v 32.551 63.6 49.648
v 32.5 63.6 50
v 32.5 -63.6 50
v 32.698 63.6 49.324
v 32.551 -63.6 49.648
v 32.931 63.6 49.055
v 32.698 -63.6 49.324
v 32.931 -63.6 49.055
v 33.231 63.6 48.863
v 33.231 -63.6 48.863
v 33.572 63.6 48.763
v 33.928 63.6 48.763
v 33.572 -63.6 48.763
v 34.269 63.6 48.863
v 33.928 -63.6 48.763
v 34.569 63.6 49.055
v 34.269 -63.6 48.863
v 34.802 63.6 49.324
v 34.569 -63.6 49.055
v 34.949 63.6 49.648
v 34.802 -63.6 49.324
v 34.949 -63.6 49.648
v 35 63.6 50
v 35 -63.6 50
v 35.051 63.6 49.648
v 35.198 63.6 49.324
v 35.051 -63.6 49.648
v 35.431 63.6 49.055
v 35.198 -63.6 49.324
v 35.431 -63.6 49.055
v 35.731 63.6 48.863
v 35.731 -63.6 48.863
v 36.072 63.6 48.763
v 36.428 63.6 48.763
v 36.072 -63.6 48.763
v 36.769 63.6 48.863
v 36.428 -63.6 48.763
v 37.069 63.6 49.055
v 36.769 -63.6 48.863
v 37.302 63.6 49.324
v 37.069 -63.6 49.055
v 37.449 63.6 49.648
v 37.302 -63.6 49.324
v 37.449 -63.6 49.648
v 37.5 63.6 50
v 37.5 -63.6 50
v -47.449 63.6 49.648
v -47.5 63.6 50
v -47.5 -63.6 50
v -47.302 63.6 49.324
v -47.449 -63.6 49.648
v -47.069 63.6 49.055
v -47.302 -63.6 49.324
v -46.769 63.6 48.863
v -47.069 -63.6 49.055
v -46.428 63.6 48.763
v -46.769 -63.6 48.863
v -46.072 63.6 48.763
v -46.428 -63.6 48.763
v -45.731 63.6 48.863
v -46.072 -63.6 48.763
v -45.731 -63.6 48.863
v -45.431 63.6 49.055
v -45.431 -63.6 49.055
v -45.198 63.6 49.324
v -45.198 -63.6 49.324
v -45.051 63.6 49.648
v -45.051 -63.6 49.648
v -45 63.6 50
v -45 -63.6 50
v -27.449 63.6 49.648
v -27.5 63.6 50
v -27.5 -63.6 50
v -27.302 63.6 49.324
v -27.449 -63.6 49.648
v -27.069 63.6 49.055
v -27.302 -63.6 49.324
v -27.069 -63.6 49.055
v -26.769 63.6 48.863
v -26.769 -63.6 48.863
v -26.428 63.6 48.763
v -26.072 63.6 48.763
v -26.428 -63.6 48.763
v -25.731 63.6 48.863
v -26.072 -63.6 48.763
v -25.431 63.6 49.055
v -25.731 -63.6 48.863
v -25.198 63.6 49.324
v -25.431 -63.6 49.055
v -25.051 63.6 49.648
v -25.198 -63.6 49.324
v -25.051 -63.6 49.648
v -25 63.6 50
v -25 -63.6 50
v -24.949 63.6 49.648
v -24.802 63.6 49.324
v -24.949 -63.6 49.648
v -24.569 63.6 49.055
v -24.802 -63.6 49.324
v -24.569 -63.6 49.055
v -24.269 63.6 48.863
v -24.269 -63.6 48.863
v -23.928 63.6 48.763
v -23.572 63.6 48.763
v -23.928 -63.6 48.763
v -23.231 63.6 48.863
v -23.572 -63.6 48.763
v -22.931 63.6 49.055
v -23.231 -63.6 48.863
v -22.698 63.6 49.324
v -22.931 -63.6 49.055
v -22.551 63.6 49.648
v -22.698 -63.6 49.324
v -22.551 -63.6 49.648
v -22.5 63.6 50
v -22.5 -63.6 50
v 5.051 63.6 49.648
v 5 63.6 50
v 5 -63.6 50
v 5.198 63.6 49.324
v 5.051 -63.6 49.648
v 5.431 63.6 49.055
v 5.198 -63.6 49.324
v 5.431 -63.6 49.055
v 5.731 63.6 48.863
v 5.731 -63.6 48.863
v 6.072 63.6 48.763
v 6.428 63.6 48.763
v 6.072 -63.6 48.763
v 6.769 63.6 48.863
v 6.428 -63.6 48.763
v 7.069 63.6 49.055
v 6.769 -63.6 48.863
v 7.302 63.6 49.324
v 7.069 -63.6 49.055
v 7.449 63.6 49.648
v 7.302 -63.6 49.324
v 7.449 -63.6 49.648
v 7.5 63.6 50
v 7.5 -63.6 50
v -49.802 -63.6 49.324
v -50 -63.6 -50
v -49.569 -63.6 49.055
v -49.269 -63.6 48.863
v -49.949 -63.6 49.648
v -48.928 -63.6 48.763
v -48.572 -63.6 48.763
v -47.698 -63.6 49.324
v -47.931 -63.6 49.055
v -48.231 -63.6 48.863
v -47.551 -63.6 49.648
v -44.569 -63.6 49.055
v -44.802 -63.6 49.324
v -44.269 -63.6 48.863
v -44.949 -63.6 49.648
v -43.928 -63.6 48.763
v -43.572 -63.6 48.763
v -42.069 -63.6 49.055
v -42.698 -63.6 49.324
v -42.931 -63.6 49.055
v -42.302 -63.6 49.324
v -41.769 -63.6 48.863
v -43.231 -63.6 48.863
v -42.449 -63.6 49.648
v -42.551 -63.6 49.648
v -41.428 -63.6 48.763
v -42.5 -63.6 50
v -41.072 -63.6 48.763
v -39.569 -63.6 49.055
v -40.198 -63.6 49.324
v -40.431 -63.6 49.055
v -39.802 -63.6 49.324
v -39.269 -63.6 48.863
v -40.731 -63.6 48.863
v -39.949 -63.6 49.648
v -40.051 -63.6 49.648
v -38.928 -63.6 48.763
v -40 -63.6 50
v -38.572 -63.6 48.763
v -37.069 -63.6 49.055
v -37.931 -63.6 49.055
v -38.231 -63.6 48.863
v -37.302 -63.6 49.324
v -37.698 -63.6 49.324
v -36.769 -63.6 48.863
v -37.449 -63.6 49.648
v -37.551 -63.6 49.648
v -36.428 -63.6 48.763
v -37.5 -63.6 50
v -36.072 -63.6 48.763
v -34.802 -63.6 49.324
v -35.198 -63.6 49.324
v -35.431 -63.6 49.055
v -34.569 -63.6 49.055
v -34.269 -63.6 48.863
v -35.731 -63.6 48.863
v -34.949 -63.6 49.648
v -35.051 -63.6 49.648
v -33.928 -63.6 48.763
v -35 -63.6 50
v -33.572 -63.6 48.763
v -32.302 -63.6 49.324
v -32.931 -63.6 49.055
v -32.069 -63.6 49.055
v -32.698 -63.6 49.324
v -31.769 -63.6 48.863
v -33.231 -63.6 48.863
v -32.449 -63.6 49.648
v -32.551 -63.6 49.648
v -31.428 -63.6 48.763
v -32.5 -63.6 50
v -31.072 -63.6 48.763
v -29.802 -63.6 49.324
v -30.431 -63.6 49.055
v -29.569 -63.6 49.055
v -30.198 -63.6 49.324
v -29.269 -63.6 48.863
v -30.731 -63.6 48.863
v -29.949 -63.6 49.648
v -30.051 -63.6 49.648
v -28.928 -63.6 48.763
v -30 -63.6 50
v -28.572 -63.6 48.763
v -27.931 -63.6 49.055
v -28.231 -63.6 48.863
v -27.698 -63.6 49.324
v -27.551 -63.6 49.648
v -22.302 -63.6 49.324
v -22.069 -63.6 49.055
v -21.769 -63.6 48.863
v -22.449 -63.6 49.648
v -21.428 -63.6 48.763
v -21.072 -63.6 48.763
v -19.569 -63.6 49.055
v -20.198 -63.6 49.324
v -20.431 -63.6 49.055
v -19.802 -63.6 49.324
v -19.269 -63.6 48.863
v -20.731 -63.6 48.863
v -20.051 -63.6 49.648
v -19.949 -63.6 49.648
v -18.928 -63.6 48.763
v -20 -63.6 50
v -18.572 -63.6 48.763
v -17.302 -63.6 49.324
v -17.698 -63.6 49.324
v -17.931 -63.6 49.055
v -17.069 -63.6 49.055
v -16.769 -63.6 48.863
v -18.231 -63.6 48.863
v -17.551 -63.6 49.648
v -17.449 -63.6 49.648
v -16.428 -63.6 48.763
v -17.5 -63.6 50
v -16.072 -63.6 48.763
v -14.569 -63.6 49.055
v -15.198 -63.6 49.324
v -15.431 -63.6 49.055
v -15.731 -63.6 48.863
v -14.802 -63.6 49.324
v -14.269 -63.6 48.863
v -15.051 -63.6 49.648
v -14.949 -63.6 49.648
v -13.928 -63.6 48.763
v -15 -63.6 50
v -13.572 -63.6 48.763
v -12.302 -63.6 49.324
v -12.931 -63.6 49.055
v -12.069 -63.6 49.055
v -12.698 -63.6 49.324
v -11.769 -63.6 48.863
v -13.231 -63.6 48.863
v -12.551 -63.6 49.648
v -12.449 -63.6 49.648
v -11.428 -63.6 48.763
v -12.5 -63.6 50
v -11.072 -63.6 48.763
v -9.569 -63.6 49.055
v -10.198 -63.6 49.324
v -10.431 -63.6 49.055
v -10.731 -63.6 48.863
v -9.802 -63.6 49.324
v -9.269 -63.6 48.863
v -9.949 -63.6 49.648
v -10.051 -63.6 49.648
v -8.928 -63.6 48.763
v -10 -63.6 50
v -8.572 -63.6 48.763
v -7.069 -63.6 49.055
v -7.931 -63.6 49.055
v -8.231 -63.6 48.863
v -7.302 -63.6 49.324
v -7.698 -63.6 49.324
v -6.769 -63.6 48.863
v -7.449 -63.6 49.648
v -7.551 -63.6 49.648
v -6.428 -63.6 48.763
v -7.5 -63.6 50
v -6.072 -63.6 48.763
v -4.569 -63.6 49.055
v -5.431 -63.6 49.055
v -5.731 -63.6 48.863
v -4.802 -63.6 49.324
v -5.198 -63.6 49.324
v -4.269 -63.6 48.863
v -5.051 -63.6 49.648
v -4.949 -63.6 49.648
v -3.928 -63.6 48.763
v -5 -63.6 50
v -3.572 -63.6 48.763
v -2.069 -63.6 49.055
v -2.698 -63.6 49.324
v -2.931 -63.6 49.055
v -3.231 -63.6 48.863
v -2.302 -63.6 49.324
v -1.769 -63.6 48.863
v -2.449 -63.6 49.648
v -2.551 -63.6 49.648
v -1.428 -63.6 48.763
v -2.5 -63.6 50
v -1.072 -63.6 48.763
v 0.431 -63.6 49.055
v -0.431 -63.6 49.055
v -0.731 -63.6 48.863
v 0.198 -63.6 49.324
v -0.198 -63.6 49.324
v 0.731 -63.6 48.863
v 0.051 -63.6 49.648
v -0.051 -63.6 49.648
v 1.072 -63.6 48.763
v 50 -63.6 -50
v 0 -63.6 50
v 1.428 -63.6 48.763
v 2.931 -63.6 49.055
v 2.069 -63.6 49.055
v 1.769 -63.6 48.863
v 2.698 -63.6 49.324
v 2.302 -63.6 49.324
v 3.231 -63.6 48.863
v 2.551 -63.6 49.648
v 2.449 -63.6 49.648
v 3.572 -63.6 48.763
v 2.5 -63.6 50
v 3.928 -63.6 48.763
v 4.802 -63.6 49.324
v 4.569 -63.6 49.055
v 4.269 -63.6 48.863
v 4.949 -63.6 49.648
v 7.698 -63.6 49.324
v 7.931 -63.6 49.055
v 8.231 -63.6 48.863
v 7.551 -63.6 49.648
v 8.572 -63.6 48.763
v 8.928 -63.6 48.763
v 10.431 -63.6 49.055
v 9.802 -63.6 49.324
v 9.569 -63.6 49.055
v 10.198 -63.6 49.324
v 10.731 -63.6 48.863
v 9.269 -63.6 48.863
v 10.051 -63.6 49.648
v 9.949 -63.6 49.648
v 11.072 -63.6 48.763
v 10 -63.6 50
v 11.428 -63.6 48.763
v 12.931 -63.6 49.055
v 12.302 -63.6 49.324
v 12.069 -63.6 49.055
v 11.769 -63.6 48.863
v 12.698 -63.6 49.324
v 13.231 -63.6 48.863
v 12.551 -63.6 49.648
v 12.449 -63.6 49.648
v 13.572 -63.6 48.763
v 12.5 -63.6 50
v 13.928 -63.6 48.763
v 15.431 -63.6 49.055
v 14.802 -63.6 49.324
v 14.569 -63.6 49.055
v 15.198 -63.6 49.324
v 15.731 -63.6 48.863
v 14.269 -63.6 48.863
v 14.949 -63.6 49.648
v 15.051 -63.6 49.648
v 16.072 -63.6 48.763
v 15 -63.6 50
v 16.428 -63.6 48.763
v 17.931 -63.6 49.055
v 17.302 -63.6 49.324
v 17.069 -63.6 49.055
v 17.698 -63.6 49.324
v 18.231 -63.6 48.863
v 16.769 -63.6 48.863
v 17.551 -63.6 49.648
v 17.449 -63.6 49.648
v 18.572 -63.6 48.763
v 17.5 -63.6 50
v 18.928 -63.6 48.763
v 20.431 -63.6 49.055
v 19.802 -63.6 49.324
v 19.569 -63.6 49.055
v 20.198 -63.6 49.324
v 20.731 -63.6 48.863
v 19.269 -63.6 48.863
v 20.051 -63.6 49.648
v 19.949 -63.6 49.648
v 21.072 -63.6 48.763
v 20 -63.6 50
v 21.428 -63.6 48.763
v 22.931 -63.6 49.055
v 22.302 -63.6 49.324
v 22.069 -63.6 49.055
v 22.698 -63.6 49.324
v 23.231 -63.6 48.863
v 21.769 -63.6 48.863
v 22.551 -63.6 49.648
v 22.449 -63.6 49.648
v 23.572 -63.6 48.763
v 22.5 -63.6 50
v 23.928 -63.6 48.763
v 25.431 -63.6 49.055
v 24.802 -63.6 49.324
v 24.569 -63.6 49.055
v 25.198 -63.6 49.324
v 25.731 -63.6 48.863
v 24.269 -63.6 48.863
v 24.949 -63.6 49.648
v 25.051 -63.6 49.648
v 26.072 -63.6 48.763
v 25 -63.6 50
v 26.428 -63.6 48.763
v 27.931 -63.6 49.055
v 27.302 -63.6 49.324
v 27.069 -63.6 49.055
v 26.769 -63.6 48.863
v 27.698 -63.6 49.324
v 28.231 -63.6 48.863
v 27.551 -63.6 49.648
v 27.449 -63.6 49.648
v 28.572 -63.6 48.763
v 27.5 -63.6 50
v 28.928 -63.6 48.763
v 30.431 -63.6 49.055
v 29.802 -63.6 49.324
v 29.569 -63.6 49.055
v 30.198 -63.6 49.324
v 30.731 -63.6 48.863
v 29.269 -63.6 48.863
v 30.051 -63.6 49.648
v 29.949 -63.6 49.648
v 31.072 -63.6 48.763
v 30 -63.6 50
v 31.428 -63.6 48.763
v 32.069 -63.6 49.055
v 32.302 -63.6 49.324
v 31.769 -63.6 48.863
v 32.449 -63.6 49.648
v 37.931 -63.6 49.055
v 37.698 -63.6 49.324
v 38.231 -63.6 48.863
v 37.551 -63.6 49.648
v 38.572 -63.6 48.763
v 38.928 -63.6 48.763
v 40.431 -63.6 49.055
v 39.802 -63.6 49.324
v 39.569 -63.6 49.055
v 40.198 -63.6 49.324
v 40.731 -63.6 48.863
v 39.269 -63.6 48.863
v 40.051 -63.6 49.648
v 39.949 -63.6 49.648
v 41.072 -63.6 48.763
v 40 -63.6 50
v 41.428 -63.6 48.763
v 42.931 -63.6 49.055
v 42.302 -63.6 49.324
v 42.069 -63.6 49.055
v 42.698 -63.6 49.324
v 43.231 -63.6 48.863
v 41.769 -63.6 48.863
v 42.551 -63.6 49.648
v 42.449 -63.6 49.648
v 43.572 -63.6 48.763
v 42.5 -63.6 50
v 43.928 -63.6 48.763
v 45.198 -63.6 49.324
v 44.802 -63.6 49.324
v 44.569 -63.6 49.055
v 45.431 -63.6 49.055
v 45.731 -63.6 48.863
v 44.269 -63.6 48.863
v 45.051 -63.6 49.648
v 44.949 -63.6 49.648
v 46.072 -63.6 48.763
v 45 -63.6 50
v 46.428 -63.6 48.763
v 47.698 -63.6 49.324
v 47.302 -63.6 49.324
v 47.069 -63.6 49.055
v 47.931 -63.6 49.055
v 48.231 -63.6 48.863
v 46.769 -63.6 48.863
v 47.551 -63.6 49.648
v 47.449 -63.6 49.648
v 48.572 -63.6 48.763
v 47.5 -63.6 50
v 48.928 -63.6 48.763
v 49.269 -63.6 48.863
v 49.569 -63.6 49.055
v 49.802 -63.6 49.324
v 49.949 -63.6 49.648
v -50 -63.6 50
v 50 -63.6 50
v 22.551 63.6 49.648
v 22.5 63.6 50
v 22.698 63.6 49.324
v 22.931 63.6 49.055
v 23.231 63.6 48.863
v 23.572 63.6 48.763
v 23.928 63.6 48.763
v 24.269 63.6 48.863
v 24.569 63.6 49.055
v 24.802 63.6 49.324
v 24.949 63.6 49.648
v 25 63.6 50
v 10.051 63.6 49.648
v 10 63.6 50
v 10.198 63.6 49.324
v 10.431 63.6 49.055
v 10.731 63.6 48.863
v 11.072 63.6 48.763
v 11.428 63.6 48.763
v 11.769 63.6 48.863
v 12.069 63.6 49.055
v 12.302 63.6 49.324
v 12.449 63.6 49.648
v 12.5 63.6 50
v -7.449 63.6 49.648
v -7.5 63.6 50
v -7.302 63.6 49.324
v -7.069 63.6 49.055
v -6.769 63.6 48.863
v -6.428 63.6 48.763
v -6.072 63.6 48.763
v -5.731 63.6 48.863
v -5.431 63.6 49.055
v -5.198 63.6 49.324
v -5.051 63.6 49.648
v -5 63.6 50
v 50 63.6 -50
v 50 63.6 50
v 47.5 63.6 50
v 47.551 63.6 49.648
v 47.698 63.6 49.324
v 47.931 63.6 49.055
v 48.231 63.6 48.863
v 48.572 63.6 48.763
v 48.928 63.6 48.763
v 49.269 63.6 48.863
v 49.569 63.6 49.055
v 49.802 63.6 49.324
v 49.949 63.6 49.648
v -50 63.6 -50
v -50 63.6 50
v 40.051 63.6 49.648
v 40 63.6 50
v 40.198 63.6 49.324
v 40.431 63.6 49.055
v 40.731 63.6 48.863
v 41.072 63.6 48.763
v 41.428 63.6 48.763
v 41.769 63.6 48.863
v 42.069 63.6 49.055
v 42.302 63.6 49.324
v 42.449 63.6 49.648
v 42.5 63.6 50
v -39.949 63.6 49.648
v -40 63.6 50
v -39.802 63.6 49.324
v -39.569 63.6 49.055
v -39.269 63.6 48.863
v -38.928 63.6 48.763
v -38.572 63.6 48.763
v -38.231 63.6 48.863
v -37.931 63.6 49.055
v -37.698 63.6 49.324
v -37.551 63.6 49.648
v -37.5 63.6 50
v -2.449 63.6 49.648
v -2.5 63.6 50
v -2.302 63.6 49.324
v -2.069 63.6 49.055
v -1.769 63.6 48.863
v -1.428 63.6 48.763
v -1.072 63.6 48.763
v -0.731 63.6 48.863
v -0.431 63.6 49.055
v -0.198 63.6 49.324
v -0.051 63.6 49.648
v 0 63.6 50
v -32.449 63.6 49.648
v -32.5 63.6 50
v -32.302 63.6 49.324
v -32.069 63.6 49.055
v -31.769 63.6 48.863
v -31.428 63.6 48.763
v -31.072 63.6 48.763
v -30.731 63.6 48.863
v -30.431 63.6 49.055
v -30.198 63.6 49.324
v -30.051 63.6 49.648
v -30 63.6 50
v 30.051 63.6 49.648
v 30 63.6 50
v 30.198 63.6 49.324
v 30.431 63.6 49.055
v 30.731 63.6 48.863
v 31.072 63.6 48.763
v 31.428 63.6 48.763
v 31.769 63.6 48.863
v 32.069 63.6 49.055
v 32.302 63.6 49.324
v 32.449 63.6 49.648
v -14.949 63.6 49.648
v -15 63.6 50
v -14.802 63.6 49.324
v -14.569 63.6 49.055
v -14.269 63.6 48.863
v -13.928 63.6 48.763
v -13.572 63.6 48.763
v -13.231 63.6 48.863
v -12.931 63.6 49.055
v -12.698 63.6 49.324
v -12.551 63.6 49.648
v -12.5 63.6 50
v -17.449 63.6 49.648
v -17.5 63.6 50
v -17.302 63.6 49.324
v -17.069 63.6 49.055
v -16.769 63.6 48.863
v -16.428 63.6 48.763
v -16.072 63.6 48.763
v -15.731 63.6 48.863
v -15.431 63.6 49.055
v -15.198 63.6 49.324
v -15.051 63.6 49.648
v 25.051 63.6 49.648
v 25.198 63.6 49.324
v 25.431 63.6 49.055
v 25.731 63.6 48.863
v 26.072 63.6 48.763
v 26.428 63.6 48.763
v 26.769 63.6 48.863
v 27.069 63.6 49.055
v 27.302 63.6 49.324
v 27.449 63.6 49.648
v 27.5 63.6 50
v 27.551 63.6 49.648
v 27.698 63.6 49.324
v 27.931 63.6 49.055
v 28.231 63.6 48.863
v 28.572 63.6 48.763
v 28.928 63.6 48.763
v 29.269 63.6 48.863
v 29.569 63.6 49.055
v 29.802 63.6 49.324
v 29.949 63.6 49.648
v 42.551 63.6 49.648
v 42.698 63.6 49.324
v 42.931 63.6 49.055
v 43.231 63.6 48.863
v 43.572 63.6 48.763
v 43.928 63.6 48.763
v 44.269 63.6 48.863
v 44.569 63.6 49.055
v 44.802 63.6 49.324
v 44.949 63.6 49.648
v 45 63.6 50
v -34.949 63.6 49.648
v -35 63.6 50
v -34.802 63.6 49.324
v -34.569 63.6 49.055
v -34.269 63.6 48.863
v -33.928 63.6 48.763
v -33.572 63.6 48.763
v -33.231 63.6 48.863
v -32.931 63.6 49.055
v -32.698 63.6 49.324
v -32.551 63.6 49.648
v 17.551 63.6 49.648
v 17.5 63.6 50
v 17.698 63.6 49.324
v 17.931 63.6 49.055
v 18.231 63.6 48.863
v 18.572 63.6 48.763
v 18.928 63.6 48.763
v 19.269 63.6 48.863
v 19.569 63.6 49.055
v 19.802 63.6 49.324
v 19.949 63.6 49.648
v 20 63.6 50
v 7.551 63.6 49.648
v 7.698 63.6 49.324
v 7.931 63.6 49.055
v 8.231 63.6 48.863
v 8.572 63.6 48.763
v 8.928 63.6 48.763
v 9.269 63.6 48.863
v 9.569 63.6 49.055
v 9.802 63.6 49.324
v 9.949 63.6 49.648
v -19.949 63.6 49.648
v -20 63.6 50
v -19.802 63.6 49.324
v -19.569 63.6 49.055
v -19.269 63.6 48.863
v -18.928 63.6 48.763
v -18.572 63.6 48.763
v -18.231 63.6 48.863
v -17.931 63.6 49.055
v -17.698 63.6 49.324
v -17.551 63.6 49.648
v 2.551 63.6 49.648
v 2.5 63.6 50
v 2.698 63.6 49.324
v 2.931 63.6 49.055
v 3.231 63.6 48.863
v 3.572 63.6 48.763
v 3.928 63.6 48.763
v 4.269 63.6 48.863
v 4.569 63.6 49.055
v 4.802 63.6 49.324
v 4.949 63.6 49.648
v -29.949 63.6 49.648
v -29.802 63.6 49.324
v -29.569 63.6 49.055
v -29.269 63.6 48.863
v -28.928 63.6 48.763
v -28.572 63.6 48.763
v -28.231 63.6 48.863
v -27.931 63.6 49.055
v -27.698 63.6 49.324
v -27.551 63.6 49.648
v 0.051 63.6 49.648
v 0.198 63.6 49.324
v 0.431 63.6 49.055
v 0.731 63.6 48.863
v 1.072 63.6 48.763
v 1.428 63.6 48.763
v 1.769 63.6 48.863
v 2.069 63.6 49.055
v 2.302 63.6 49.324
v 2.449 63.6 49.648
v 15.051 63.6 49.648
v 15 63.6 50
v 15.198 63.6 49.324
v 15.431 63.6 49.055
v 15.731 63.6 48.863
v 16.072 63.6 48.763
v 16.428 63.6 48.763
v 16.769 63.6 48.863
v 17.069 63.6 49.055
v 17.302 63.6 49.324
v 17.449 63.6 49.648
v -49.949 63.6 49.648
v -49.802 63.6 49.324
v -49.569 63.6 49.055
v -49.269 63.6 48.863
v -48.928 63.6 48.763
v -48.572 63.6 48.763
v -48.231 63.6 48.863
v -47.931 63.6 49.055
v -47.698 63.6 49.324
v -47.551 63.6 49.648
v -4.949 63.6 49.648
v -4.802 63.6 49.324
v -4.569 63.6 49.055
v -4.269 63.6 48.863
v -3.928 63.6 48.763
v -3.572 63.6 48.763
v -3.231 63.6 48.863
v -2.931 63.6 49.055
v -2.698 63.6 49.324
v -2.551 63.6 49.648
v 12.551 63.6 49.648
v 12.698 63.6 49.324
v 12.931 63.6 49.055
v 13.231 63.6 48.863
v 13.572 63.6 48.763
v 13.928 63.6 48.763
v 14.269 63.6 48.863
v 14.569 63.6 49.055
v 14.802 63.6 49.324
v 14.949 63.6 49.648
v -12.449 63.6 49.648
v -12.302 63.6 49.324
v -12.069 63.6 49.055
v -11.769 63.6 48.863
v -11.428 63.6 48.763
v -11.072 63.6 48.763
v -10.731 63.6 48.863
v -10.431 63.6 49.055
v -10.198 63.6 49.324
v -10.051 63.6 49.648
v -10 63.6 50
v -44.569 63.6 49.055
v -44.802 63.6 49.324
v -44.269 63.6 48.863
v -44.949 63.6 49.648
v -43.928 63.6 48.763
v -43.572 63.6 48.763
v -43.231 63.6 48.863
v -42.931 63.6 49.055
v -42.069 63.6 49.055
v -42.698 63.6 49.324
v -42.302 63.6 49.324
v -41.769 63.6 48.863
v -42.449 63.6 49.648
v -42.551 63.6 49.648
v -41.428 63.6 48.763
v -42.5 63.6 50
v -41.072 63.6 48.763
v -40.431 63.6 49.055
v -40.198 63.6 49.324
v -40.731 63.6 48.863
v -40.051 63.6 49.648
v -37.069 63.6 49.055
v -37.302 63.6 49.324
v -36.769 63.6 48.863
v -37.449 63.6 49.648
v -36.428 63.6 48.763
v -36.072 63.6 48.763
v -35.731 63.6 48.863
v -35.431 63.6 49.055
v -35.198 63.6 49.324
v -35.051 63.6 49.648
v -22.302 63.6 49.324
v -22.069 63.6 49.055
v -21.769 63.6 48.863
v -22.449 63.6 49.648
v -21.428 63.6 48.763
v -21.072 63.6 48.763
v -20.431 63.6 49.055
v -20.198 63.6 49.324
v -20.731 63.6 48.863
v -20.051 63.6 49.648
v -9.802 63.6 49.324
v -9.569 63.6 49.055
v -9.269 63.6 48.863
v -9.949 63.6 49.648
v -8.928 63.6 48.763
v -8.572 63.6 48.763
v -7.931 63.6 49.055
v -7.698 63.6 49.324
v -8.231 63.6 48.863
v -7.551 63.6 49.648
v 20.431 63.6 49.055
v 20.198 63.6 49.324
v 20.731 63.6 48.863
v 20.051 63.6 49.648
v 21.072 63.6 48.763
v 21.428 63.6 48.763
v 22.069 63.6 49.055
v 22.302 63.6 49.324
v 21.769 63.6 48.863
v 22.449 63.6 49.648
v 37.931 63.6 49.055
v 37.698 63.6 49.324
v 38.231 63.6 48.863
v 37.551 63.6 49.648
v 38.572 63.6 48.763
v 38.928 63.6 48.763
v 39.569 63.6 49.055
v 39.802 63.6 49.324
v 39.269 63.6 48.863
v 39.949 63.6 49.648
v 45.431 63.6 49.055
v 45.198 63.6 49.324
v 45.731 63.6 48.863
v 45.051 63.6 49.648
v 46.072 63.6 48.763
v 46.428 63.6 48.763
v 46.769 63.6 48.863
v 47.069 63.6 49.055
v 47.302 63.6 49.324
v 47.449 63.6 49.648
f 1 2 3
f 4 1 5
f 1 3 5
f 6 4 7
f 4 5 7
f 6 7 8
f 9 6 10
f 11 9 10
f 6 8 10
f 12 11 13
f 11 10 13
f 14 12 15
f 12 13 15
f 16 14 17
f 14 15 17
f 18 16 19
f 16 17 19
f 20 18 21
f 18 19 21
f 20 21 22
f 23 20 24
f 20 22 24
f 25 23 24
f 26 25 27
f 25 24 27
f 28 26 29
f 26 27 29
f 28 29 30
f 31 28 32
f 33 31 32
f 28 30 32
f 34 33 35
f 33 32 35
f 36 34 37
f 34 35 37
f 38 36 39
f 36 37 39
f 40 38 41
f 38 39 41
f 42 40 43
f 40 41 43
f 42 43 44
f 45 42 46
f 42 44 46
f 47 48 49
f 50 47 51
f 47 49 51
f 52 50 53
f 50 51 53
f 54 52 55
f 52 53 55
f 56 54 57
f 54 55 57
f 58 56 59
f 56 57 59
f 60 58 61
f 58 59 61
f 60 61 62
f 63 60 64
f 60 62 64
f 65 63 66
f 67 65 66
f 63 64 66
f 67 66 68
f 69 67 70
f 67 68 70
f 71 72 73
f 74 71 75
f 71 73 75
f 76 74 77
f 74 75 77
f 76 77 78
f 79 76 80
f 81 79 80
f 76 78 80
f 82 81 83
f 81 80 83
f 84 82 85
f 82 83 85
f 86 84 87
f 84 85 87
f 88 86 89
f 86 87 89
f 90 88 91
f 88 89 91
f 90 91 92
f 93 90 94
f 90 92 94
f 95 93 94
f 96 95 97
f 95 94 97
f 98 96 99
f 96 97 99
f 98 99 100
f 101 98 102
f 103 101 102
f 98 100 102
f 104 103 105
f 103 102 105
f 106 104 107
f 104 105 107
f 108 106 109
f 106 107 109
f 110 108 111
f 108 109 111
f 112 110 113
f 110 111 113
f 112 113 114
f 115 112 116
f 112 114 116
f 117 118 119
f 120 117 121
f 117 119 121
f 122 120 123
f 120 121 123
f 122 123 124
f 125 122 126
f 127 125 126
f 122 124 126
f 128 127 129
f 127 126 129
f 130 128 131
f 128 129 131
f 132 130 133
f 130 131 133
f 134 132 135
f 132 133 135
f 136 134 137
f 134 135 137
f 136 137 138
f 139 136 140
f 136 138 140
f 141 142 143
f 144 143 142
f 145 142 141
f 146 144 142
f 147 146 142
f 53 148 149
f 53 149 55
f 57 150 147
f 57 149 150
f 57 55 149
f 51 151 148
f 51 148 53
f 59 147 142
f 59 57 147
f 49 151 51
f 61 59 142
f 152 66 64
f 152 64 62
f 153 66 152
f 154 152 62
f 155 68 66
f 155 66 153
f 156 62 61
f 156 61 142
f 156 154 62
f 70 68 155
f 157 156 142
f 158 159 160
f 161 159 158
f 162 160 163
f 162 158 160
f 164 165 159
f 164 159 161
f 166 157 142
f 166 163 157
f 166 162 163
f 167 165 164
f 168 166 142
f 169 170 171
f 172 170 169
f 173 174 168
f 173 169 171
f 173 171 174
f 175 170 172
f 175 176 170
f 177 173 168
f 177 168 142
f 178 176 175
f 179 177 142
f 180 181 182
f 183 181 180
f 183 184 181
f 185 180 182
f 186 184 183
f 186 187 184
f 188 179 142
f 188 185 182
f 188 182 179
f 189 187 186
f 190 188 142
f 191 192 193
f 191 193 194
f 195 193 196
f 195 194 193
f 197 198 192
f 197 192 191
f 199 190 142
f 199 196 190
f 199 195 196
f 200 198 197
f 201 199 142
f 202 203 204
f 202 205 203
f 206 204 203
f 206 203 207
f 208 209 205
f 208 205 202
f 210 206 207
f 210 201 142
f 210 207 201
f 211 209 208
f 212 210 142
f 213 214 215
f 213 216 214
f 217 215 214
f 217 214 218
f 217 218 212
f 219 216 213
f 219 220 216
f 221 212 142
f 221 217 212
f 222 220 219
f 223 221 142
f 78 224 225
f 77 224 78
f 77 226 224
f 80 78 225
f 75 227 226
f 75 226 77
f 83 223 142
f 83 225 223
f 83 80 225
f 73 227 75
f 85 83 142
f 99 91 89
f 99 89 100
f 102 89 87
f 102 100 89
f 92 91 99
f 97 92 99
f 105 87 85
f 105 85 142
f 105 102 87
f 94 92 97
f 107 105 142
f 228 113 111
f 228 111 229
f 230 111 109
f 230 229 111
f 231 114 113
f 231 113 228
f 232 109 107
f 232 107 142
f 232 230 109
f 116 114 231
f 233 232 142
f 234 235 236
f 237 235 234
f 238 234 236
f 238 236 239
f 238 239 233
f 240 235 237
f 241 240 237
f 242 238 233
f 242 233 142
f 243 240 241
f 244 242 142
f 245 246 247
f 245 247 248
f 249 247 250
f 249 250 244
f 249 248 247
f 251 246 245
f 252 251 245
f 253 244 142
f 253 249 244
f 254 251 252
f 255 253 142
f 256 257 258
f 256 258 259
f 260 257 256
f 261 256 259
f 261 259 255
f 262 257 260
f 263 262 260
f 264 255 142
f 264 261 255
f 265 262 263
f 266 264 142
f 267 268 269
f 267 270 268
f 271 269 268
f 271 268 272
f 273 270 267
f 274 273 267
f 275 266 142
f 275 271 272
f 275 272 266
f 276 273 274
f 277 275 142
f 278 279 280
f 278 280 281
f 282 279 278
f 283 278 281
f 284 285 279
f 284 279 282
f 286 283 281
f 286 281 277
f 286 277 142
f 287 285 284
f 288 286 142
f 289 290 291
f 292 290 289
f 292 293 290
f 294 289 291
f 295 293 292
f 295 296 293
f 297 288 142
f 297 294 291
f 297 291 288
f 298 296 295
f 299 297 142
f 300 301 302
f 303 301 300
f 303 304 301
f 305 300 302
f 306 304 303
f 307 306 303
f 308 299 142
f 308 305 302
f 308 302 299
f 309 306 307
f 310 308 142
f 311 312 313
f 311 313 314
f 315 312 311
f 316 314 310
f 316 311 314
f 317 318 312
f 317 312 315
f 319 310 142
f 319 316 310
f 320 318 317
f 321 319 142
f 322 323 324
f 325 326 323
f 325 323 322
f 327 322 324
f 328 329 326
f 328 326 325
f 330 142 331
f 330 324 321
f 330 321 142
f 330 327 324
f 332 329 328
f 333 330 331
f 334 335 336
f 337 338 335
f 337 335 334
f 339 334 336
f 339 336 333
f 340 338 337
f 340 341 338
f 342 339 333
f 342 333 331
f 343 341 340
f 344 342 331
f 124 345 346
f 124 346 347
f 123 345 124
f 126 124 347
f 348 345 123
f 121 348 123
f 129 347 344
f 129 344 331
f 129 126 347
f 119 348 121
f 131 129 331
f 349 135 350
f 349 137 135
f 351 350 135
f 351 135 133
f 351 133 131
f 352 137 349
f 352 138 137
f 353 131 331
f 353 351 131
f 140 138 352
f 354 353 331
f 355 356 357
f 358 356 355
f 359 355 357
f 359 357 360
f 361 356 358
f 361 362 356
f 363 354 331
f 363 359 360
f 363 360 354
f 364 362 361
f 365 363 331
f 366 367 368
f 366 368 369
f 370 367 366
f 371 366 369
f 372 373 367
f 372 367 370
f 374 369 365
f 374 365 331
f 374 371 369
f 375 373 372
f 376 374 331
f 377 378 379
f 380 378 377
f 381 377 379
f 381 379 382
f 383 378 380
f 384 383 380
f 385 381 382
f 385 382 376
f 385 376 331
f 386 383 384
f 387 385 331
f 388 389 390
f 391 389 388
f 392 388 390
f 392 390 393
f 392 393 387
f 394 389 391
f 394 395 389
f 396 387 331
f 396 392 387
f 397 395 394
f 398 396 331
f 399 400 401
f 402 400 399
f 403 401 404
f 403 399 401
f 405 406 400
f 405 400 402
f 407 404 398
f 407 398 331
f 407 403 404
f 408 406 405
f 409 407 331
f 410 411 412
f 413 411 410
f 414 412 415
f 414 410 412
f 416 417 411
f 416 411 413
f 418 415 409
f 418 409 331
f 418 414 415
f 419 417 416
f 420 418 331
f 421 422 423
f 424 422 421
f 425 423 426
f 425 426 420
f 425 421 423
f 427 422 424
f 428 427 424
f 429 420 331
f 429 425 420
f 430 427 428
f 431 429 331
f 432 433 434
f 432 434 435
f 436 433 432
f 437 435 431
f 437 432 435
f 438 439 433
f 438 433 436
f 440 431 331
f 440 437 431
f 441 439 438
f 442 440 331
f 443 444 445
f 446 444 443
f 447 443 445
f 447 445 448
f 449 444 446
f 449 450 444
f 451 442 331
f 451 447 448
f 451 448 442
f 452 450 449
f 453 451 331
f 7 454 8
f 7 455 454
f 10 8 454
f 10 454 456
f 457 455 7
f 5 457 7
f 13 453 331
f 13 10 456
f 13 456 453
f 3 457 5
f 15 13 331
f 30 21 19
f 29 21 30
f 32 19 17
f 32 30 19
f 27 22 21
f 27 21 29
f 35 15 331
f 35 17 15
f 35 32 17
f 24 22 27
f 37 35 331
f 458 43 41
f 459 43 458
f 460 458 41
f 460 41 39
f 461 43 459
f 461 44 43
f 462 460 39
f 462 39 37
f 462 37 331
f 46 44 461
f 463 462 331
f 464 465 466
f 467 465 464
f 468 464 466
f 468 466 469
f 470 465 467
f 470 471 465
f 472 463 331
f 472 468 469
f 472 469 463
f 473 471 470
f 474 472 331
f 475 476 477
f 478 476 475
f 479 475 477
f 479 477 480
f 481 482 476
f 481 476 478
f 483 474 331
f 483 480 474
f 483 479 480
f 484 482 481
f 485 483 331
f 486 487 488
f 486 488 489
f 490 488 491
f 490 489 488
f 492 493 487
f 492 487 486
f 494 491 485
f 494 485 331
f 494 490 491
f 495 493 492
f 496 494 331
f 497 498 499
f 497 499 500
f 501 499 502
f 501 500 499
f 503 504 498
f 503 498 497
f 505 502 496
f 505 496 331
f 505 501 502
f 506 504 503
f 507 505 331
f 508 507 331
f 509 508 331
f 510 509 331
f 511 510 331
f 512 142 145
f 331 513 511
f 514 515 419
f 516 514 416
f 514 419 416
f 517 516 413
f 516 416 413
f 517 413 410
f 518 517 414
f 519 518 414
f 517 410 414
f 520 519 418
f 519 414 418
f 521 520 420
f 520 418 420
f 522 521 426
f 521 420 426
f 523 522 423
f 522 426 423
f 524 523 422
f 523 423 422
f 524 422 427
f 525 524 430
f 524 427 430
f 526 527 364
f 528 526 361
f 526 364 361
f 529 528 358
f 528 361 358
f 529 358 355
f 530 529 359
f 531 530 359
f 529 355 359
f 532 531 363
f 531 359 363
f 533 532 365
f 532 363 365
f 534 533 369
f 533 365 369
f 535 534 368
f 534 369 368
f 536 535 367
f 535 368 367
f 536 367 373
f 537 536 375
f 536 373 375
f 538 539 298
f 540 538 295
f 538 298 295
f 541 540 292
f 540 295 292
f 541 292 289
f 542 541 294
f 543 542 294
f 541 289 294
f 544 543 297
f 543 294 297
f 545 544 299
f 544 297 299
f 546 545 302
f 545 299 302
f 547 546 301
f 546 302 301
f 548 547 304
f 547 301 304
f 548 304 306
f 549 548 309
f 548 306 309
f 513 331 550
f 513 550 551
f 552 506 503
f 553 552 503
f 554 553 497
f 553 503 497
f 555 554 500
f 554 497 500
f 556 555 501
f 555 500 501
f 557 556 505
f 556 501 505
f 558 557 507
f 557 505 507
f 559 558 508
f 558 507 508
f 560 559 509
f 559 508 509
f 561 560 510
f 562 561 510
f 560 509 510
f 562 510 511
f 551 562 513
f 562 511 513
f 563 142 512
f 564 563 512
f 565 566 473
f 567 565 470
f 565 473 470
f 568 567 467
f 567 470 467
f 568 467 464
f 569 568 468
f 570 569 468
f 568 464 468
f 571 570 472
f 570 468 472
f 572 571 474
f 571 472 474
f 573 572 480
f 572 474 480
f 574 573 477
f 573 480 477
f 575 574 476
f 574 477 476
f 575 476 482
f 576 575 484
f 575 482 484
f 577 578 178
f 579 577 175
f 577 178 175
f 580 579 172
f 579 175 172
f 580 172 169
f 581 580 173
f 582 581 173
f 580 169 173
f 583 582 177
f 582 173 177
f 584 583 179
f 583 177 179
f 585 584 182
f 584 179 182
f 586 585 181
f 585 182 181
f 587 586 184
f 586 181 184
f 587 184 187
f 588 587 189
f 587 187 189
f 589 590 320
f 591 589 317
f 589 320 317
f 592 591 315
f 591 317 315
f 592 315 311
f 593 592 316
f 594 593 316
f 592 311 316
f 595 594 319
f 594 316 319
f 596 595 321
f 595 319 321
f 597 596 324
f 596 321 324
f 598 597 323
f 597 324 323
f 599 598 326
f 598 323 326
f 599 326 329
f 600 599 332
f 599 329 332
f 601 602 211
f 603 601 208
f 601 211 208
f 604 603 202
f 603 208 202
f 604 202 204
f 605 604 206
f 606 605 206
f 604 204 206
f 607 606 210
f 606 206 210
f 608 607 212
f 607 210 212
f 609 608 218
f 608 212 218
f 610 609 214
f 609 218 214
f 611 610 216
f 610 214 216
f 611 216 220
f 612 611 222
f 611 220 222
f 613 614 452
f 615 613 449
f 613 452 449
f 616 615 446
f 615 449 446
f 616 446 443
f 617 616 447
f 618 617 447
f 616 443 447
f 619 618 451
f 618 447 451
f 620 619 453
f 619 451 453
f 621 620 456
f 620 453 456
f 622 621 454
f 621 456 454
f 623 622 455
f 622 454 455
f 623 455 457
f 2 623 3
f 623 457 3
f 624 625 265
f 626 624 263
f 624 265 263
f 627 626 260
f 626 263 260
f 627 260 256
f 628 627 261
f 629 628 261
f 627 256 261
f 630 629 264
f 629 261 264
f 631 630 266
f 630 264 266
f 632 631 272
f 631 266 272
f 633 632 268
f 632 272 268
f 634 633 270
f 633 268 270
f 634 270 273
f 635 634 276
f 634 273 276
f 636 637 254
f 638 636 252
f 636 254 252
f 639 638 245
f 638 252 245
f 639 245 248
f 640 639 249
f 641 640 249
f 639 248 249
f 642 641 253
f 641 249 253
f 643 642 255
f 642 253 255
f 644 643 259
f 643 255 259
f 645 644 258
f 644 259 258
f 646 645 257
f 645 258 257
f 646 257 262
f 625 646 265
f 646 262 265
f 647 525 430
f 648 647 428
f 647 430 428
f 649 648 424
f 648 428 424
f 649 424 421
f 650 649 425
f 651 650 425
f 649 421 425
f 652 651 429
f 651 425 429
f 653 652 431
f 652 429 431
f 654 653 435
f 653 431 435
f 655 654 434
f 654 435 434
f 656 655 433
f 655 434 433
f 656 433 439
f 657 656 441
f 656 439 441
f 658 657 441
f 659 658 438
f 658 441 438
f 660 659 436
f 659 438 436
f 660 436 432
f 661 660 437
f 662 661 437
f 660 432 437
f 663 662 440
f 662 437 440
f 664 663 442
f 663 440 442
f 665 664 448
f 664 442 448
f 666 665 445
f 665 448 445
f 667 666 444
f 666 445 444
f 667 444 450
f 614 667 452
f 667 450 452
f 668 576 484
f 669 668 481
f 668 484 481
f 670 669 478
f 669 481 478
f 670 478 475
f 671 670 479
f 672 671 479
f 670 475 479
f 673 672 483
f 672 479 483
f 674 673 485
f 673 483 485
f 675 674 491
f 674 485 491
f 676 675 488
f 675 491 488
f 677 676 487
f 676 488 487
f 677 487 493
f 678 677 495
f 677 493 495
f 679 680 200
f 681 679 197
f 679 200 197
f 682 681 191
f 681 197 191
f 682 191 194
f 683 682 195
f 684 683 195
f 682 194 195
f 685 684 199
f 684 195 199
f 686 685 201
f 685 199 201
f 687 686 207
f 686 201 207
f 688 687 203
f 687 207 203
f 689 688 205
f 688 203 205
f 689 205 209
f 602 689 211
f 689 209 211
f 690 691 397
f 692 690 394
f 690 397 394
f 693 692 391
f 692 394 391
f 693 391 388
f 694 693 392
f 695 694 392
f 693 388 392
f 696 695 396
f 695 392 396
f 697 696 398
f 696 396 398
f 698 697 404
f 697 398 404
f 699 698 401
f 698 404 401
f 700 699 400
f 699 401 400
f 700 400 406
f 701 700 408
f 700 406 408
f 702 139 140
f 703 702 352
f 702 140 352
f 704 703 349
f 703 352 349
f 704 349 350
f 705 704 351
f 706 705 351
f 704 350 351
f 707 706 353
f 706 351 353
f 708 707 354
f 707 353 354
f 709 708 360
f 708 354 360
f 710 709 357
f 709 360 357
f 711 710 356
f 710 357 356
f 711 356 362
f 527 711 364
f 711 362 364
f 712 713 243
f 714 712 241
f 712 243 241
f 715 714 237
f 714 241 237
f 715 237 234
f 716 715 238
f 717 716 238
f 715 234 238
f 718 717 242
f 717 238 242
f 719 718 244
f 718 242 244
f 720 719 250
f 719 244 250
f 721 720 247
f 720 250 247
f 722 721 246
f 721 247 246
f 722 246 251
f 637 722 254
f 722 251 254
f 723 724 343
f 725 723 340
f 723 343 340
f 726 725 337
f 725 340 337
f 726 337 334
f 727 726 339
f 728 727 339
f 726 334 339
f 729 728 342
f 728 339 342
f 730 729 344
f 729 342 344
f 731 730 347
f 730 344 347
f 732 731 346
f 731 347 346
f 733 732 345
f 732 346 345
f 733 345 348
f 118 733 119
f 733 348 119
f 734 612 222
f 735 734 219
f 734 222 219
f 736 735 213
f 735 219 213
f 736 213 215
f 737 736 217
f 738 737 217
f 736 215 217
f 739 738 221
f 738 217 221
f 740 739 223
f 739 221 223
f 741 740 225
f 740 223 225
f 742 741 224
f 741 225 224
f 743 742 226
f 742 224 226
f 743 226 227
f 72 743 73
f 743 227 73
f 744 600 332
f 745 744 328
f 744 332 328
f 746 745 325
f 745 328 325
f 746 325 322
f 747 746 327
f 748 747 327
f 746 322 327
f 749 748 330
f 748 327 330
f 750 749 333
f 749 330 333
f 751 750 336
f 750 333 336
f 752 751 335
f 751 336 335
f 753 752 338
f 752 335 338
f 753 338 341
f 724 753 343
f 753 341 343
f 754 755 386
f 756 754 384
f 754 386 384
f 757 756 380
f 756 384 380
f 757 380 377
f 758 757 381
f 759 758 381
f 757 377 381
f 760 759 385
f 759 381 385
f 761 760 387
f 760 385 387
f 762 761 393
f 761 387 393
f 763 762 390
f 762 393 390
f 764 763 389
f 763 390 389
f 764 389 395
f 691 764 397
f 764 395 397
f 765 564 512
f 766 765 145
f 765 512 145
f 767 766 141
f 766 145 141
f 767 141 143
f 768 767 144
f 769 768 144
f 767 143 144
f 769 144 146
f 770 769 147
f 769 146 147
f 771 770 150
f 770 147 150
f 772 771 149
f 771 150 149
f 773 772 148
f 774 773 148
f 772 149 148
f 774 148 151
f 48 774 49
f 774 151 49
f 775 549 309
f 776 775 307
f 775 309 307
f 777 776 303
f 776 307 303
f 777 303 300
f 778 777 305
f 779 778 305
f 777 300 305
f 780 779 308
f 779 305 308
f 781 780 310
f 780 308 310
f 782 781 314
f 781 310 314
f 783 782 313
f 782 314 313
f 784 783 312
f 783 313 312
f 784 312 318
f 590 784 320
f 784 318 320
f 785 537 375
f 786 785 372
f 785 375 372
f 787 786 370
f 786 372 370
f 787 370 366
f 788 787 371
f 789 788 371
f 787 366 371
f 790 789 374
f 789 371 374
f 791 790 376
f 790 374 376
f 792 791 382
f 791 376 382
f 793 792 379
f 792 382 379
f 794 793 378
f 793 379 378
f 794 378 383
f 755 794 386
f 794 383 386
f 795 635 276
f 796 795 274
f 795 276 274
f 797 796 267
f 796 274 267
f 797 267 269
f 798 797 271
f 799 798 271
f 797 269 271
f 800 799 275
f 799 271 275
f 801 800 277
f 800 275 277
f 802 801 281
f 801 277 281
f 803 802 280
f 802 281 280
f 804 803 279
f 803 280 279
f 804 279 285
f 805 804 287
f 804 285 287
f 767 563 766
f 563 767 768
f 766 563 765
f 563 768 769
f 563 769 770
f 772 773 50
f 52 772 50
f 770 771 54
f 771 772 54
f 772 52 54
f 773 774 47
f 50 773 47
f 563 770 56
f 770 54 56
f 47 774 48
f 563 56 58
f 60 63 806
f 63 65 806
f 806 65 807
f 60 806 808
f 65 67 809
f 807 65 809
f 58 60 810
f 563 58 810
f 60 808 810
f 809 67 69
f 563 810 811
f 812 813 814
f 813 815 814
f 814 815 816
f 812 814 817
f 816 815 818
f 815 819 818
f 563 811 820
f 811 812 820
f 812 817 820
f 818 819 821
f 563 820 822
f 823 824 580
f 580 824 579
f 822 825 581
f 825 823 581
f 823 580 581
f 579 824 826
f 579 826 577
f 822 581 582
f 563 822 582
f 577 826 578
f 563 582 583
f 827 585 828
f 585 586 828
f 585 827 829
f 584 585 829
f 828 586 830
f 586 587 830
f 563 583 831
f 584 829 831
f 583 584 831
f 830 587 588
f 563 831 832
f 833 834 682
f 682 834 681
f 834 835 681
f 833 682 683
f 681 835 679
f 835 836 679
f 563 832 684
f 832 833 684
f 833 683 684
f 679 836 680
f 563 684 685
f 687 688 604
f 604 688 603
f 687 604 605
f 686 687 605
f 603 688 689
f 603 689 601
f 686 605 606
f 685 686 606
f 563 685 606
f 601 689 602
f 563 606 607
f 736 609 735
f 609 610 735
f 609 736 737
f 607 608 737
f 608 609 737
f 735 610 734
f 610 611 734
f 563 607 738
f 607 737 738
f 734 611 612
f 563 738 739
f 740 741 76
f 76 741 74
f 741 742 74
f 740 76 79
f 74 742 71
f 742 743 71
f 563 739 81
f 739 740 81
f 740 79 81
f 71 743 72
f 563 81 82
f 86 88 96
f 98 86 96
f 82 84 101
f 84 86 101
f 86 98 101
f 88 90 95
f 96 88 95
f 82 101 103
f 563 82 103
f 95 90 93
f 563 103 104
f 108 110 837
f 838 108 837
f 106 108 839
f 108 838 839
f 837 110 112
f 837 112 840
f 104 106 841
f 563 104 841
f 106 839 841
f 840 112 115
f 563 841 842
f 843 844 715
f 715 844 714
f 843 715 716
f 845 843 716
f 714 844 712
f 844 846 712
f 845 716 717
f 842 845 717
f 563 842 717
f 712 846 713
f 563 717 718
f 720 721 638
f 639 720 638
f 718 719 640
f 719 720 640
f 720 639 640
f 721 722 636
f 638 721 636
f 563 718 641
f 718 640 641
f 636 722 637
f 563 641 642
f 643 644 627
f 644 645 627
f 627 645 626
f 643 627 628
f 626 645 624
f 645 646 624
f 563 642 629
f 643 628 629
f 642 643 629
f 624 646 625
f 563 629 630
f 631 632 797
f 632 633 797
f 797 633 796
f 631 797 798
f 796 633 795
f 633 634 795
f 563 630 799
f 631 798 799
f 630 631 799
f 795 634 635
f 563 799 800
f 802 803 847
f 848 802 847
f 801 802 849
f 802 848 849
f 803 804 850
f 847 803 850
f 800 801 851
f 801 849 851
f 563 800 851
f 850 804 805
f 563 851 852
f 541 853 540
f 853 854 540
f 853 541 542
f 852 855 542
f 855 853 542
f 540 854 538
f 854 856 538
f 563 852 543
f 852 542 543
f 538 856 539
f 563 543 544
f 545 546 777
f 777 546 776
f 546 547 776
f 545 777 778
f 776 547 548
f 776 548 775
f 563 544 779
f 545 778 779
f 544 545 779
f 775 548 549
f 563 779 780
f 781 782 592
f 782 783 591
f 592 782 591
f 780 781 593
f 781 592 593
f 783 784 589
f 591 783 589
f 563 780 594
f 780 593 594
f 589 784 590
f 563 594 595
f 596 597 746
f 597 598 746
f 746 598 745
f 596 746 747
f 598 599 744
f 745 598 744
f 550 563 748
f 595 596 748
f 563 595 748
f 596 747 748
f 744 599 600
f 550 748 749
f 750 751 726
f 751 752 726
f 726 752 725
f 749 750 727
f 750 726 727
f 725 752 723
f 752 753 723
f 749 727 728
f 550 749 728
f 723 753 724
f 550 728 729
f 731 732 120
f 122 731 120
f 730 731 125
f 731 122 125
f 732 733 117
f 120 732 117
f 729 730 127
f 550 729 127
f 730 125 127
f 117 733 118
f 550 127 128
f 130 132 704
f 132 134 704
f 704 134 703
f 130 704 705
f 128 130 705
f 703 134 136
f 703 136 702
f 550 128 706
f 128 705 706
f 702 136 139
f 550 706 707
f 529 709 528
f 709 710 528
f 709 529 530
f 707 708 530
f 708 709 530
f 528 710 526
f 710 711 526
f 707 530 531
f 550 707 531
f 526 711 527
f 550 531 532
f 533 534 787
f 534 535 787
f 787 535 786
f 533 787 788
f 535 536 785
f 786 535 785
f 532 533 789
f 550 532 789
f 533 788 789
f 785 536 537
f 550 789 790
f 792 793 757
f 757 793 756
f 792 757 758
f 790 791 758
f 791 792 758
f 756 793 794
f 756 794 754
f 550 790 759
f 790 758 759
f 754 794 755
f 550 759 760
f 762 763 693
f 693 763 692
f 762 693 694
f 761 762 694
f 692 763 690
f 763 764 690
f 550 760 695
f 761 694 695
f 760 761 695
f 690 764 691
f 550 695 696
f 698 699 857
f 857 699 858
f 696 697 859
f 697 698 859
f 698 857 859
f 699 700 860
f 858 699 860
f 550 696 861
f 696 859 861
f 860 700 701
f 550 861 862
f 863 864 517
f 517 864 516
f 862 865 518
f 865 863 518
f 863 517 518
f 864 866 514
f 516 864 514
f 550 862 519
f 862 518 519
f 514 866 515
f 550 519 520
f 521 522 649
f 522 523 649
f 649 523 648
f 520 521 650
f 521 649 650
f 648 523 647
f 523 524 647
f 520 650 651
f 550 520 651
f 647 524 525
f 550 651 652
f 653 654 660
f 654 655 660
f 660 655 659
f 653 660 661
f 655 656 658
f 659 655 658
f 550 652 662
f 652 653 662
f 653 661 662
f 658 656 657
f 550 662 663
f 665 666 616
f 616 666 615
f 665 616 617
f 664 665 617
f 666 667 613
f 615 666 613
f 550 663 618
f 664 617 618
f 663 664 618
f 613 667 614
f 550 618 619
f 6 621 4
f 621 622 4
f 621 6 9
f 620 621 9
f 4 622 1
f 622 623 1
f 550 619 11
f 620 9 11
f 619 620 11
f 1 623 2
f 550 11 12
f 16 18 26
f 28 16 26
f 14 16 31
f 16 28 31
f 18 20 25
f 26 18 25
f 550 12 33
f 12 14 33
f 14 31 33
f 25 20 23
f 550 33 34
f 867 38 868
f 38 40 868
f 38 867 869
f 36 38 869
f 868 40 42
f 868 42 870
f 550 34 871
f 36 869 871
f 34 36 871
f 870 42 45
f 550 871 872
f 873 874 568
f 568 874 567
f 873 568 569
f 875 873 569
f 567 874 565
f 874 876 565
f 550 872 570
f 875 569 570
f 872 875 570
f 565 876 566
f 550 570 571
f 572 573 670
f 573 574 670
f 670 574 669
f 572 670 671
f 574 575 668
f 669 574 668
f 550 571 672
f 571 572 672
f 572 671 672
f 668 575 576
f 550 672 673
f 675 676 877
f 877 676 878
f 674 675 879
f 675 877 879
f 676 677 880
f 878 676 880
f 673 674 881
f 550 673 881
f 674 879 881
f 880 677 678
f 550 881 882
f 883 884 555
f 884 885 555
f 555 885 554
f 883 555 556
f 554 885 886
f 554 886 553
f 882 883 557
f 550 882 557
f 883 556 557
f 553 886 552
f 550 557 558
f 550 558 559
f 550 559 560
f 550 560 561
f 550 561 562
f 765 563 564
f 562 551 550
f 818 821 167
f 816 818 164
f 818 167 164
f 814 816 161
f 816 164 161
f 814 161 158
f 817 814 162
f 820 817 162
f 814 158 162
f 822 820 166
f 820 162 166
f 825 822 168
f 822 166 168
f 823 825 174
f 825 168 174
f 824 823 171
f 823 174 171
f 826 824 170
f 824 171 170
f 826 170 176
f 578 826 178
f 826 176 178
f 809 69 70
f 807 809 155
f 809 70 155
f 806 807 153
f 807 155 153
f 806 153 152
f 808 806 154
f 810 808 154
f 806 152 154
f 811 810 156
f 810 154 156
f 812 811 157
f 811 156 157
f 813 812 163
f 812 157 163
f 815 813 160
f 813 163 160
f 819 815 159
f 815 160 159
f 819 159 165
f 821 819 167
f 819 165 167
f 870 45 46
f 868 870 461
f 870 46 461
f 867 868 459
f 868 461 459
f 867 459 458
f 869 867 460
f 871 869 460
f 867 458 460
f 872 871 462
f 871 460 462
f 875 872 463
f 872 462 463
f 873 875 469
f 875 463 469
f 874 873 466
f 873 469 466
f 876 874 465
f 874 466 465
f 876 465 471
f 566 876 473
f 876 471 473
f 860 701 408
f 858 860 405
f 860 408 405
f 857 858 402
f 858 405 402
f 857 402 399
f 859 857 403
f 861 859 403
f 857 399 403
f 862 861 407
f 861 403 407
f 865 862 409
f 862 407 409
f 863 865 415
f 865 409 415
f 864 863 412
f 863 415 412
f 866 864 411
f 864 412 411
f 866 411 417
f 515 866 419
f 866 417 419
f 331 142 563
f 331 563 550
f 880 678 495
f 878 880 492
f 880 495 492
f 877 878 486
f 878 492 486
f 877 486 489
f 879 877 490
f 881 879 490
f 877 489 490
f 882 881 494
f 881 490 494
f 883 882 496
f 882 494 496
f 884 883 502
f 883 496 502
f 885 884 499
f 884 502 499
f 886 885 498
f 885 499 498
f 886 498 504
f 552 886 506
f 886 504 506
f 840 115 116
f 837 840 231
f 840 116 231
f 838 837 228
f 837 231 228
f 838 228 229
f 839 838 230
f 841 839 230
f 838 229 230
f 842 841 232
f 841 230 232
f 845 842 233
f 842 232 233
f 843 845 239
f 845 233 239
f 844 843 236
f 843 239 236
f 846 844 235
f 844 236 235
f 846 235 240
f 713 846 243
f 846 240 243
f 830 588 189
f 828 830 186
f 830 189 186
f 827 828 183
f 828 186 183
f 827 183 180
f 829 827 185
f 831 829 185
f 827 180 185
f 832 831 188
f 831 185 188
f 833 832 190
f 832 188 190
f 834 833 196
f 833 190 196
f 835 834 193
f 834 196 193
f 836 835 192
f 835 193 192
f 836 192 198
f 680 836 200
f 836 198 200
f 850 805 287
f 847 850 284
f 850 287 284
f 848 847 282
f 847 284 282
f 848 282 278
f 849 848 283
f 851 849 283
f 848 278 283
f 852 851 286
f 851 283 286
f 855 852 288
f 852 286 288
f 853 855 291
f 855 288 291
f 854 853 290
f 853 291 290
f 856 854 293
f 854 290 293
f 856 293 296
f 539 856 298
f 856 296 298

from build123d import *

# Parameters (mm, degrees)
F0_W     = 100
F0_H     = 100
F1_DEPTH = 63.6
F2_R     = 1.25
F3_DEPTH = 144.2


with BuildPart() as f1:
    # F0 (on Front) → F1 (new body, symmetric)
    with BuildSketch(Plane.XZ):
        Rectangle(F0_W, F0_H)
    extrude(amount=F1_DEPTH, both=True)

    # F2 (on face) → F3 (cut)
    with BuildSketch(Plane.XZ.offset(63.6)):
        with Locations((-48.75, 50)):
            Circle(F2_R)
        with BuildLine():
            ThreePointArc((50, 50), (48.75, 51.25), (47.5, 50))
            ThreePointArc((47.5, 50), (48.75, 48.75), (50, 50))
        make_face()
        with BuildLine():
            ThreePointArc((47.5, 50), (46.25, 51.25), (45, 50))
            ThreePointArc((45, 50), (46.25, 48.75), (47.5, 50))
        make_face()
        with BuildLine():
            ThreePointArc((45, 50), (43.75, 51.25), (42.5, 50))
            ThreePointArc((42.5, 50), (43.75, 48.75), (45, 50))
        make_face()
        with BuildLine():
            ThreePointArc((42.5, 50), (41.25, 51.25), (40, 50))
            ThreePointArc((40, 50), (41.25, 48.75), (42.5, 50))
        make_face()
        with BuildLine():
            ThreePointArc((40, 50), (38.75, 51.25), (37.5, 50))
            ThreePointArc((37.5, 50), (38.75, 48.75), (40, 50))
        make_face()
        with BuildLine():
            ThreePointArc((37.5, 50), (36.25, 51.25), (35, 50))
            ThreePointArc((35, 50), (36.25, 48.75), (37.5, 50))
        make_face()
        with BuildLine():
            ThreePointArc((35, 50), (33.75, 51.25), (32.5, 50))
            ThreePointArc((32.5, 50), (33.75, 48.75), (35, 50))
        make_face()
        with BuildLine():
            ThreePointArc((32.5, 50), (31.25, 51.25), (30, 50))
            ThreePointArc((30, 50), (31.25, 48.75), (32.5, 50))
        make_face()
        with BuildLine():
            ThreePointArc((30, 50), (28.75, 51.25), (27.5, 50))
            ThreePointArc((27.5, 50), (28.75, 48.75), (30, 50))
        make_face()
        with BuildLine():
            ThreePointArc((27.5, 50), (26.25, 51.25), (25, 50))
            ThreePointArc((25, 50), (26.25, 48.75), (27.5, 50))
        make_face()
        with BuildLine():
            ThreePointArc((25, 50), (23.75, 51.25), (22.5, 50))
            ThreePointArc((22.5, 50), (23.75, 48.75), (25, 50))
        make_face()
        with BuildLine():
            ThreePointArc((22.5, 50), (21.25, 51.25), (20, 50))
            ThreePointArc((20, 50), (21.25, 48.75), (22.5, 50))
        make_face()
        with BuildLine():
            ThreePointArc((20, 50), (18.75, 51.25), (17.5, 50))
            ThreePointArc((17.5, 50), (18.75, 48.75), (20, 50))
        make_face()
        with BuildLine():
            ThreePointArc((17.5, 50), (16.25, 51.25), (15, 50))
            ThreePointArc((15, 50), (16.25, 48.75), (17.5, 50))
        make_face()
        with BuildLine():
            ThreePointArc((15, 50), (13.75, 51.25), (12.5, 50))
            ThreePointArc((12.5, 50), (13.75, 48.75), (15, 50))
        make_face()
        with BuildLine():
            ThreePointArc((12.5, 50), (11.25, 51.25), (10, 50))
            ThreePointArc((10, 50), (11.25, 48.75), (12.5, 50))
        make_face()
        with BuildLine():
            ThreePointArc((10, 50), (8.75, 51.25), (7.5, 50))
            ThreePointArc((7.5, 50), (8.75, 48.75), (10, 50))
        make_face()
        with BuildLine():
            ThreePointArc((7.5, 50), (6.25, 51.25), (5, 50))
            ThreePointArc((5, 50), (6.25, 48.75), (7.5, 50))
        make_face()
        with BuildLine():
            ThreePointArc((5, 50), (3.75, 51.25), (2.5, 50))
            ThreePointArc((2.5, 50), (3.75, 48.75), (5, 50))
        make_face()
        with BuildLine():
            ThreePointArc((2.5, 50), (1.25, 51.25), (0, 50))
            ThreePointArc((0, 50), (1.25, 48.75), (2.5, 50))
        make_face()
        with BuildLine():
            ThreePointArc((0, 50), (-1.25, 51.25), (-2.5, 50))
            ThreePointArc((-2.5, 50), (-1.25, 48.75), (0, 50))
        make_face()
        with BuildLine():
            ThreePointArc((-2.5, 50), (-3.75, 51.25), (-5, 50))
            ThreePointArc((-5, 50), (-3.75, 48.75), (-2.5, 50))
        make_face()
        with BuildLine():
            ThreePointArc((-5, 50), (-6.25, 51.25), (-7.5, 50))
            ThreePointArc((-7.5, 50), (-6.25, 48.75), (-5, 50))
        make_face()
        with BuildLine():
            ThreePointArc((-7.5, 50), (-8.75, 51.25), (-10, 50))
            ThreePointArc((-10, 50), (-8.75, 48.75), (-7.5, 50))
        make_face()
        with BuildLine():
            ThreePointArc((-10, 50), (-11.25, 51.25), (-12.5, 50))
            ThreePointArc((-12.5, 50), (-11.25, 48.75), (-10, 50))
        make_face()
        with BuildLine():
            ThreePointArc((-12.5, 50), (-13.75, 51.25), (-15, 50))
            ThreePointArc((-15, 50), (-13.75, 48.75), (-12.5, 50))
        make_face()
        with BuildLine():
            ThreePointArc((-15, 50), (-16.25, 51.25), (-17.5, 50))
            ThreePointArc((-17.5, 50), (-16.25, 48.75), (-15, 50))
        make_face()
        with BuildLine():
            ThreePointArc((-17.5, 50), (-18.75, 51.25), (-20, 50))
            ThreePointArc((-20, 50), (-18.75, 48.75), (-17.5, 50))
        make_face()
        with BuildLine():
            ThreePointArc((-20, 50), (-21.25, 51.25), (-22.5, 50))
            ThreePointArc((-22.5, 50), (-21.25, 48.75), (-20, 50))
        make_face()
        with BuildLine():
            ThreePointArc((-22.5, 50), (-23.75, 51.25), (-25, 50))
            ThreePointArc((-25, 50), (-23.75, 48.75), (-22.5, 50))
        make_face()
        with BuildLine():
            ThreePointArc((-25, 50), (-26.25, 51.25), (-27.5, 50))
            ThreePointArc((-27.5, 50), (-26.25, 48.75), (-25, 50))
        make_face()
        with BuildLine():
            ThreePointArc((-27.5, 50), (-28.75, 51.25), (-30, 50))
            ThreePointArc((-30, 50), (-28.75, 48.75), (-27.5, 50))
        make_face()
        with BuildLine():
            ThreePointArc((-30, 50), (-31.25, 51.25), (-32.5, 50))
            ThreePointArc((-32.5, 50), (-31.25, 48.75), (-30, 50))
        make_face()
        with BuildLine():
            ThreePointArc((-32.5, 50), (-33.75, 51.25), (-35, 50))
            ThreePointArc((-35, 50), (-33.75, 48.75), (-32.5, 50))
        make_face()
        with BuildLine():
            ThreePointArc((-35, 50), (-36.25, 51.25), (-37.5, 50))
            ThreePointArc((-37.5, 50), (-36.25, 48.75), (-35, 50))
        make_face()
        with BuildLine():
            ThreePointArc((-37.5, 50), (-38.75, 51.25), (-40, 50))
            ThreePointArc((-40, 50), (-38.75, 48.75), (-37.5, 50))
        make_face()
        with BuildLine():
            ThreePointArc((-40, 50), (-41.25, 51.25), (-42.5, 50))
            ThreePointArc((-42.5, 50), (-41.25, 48.75), (-40, 50))
        make_face()
        with BuildLine():
            ThreePointArc((-42.5, 50), (-43.75, 51.25), (-45, 50))
            ThreePointArc((-45, 50), (-43.75, 48.75), (-42.5, 50))
        make_face()
        with BuildLine():
            ThreePointArc((-45, 50), (-46.25, 51.25), (-47.5, 50))
            ThreePointArc((-47.5, 50), (-46.25, 48.75), (-45, 50))
        make_face()
    extrude(amount=-F3_DEPTH, mode=Mode.SUBTRACT)


solid = f1.part
